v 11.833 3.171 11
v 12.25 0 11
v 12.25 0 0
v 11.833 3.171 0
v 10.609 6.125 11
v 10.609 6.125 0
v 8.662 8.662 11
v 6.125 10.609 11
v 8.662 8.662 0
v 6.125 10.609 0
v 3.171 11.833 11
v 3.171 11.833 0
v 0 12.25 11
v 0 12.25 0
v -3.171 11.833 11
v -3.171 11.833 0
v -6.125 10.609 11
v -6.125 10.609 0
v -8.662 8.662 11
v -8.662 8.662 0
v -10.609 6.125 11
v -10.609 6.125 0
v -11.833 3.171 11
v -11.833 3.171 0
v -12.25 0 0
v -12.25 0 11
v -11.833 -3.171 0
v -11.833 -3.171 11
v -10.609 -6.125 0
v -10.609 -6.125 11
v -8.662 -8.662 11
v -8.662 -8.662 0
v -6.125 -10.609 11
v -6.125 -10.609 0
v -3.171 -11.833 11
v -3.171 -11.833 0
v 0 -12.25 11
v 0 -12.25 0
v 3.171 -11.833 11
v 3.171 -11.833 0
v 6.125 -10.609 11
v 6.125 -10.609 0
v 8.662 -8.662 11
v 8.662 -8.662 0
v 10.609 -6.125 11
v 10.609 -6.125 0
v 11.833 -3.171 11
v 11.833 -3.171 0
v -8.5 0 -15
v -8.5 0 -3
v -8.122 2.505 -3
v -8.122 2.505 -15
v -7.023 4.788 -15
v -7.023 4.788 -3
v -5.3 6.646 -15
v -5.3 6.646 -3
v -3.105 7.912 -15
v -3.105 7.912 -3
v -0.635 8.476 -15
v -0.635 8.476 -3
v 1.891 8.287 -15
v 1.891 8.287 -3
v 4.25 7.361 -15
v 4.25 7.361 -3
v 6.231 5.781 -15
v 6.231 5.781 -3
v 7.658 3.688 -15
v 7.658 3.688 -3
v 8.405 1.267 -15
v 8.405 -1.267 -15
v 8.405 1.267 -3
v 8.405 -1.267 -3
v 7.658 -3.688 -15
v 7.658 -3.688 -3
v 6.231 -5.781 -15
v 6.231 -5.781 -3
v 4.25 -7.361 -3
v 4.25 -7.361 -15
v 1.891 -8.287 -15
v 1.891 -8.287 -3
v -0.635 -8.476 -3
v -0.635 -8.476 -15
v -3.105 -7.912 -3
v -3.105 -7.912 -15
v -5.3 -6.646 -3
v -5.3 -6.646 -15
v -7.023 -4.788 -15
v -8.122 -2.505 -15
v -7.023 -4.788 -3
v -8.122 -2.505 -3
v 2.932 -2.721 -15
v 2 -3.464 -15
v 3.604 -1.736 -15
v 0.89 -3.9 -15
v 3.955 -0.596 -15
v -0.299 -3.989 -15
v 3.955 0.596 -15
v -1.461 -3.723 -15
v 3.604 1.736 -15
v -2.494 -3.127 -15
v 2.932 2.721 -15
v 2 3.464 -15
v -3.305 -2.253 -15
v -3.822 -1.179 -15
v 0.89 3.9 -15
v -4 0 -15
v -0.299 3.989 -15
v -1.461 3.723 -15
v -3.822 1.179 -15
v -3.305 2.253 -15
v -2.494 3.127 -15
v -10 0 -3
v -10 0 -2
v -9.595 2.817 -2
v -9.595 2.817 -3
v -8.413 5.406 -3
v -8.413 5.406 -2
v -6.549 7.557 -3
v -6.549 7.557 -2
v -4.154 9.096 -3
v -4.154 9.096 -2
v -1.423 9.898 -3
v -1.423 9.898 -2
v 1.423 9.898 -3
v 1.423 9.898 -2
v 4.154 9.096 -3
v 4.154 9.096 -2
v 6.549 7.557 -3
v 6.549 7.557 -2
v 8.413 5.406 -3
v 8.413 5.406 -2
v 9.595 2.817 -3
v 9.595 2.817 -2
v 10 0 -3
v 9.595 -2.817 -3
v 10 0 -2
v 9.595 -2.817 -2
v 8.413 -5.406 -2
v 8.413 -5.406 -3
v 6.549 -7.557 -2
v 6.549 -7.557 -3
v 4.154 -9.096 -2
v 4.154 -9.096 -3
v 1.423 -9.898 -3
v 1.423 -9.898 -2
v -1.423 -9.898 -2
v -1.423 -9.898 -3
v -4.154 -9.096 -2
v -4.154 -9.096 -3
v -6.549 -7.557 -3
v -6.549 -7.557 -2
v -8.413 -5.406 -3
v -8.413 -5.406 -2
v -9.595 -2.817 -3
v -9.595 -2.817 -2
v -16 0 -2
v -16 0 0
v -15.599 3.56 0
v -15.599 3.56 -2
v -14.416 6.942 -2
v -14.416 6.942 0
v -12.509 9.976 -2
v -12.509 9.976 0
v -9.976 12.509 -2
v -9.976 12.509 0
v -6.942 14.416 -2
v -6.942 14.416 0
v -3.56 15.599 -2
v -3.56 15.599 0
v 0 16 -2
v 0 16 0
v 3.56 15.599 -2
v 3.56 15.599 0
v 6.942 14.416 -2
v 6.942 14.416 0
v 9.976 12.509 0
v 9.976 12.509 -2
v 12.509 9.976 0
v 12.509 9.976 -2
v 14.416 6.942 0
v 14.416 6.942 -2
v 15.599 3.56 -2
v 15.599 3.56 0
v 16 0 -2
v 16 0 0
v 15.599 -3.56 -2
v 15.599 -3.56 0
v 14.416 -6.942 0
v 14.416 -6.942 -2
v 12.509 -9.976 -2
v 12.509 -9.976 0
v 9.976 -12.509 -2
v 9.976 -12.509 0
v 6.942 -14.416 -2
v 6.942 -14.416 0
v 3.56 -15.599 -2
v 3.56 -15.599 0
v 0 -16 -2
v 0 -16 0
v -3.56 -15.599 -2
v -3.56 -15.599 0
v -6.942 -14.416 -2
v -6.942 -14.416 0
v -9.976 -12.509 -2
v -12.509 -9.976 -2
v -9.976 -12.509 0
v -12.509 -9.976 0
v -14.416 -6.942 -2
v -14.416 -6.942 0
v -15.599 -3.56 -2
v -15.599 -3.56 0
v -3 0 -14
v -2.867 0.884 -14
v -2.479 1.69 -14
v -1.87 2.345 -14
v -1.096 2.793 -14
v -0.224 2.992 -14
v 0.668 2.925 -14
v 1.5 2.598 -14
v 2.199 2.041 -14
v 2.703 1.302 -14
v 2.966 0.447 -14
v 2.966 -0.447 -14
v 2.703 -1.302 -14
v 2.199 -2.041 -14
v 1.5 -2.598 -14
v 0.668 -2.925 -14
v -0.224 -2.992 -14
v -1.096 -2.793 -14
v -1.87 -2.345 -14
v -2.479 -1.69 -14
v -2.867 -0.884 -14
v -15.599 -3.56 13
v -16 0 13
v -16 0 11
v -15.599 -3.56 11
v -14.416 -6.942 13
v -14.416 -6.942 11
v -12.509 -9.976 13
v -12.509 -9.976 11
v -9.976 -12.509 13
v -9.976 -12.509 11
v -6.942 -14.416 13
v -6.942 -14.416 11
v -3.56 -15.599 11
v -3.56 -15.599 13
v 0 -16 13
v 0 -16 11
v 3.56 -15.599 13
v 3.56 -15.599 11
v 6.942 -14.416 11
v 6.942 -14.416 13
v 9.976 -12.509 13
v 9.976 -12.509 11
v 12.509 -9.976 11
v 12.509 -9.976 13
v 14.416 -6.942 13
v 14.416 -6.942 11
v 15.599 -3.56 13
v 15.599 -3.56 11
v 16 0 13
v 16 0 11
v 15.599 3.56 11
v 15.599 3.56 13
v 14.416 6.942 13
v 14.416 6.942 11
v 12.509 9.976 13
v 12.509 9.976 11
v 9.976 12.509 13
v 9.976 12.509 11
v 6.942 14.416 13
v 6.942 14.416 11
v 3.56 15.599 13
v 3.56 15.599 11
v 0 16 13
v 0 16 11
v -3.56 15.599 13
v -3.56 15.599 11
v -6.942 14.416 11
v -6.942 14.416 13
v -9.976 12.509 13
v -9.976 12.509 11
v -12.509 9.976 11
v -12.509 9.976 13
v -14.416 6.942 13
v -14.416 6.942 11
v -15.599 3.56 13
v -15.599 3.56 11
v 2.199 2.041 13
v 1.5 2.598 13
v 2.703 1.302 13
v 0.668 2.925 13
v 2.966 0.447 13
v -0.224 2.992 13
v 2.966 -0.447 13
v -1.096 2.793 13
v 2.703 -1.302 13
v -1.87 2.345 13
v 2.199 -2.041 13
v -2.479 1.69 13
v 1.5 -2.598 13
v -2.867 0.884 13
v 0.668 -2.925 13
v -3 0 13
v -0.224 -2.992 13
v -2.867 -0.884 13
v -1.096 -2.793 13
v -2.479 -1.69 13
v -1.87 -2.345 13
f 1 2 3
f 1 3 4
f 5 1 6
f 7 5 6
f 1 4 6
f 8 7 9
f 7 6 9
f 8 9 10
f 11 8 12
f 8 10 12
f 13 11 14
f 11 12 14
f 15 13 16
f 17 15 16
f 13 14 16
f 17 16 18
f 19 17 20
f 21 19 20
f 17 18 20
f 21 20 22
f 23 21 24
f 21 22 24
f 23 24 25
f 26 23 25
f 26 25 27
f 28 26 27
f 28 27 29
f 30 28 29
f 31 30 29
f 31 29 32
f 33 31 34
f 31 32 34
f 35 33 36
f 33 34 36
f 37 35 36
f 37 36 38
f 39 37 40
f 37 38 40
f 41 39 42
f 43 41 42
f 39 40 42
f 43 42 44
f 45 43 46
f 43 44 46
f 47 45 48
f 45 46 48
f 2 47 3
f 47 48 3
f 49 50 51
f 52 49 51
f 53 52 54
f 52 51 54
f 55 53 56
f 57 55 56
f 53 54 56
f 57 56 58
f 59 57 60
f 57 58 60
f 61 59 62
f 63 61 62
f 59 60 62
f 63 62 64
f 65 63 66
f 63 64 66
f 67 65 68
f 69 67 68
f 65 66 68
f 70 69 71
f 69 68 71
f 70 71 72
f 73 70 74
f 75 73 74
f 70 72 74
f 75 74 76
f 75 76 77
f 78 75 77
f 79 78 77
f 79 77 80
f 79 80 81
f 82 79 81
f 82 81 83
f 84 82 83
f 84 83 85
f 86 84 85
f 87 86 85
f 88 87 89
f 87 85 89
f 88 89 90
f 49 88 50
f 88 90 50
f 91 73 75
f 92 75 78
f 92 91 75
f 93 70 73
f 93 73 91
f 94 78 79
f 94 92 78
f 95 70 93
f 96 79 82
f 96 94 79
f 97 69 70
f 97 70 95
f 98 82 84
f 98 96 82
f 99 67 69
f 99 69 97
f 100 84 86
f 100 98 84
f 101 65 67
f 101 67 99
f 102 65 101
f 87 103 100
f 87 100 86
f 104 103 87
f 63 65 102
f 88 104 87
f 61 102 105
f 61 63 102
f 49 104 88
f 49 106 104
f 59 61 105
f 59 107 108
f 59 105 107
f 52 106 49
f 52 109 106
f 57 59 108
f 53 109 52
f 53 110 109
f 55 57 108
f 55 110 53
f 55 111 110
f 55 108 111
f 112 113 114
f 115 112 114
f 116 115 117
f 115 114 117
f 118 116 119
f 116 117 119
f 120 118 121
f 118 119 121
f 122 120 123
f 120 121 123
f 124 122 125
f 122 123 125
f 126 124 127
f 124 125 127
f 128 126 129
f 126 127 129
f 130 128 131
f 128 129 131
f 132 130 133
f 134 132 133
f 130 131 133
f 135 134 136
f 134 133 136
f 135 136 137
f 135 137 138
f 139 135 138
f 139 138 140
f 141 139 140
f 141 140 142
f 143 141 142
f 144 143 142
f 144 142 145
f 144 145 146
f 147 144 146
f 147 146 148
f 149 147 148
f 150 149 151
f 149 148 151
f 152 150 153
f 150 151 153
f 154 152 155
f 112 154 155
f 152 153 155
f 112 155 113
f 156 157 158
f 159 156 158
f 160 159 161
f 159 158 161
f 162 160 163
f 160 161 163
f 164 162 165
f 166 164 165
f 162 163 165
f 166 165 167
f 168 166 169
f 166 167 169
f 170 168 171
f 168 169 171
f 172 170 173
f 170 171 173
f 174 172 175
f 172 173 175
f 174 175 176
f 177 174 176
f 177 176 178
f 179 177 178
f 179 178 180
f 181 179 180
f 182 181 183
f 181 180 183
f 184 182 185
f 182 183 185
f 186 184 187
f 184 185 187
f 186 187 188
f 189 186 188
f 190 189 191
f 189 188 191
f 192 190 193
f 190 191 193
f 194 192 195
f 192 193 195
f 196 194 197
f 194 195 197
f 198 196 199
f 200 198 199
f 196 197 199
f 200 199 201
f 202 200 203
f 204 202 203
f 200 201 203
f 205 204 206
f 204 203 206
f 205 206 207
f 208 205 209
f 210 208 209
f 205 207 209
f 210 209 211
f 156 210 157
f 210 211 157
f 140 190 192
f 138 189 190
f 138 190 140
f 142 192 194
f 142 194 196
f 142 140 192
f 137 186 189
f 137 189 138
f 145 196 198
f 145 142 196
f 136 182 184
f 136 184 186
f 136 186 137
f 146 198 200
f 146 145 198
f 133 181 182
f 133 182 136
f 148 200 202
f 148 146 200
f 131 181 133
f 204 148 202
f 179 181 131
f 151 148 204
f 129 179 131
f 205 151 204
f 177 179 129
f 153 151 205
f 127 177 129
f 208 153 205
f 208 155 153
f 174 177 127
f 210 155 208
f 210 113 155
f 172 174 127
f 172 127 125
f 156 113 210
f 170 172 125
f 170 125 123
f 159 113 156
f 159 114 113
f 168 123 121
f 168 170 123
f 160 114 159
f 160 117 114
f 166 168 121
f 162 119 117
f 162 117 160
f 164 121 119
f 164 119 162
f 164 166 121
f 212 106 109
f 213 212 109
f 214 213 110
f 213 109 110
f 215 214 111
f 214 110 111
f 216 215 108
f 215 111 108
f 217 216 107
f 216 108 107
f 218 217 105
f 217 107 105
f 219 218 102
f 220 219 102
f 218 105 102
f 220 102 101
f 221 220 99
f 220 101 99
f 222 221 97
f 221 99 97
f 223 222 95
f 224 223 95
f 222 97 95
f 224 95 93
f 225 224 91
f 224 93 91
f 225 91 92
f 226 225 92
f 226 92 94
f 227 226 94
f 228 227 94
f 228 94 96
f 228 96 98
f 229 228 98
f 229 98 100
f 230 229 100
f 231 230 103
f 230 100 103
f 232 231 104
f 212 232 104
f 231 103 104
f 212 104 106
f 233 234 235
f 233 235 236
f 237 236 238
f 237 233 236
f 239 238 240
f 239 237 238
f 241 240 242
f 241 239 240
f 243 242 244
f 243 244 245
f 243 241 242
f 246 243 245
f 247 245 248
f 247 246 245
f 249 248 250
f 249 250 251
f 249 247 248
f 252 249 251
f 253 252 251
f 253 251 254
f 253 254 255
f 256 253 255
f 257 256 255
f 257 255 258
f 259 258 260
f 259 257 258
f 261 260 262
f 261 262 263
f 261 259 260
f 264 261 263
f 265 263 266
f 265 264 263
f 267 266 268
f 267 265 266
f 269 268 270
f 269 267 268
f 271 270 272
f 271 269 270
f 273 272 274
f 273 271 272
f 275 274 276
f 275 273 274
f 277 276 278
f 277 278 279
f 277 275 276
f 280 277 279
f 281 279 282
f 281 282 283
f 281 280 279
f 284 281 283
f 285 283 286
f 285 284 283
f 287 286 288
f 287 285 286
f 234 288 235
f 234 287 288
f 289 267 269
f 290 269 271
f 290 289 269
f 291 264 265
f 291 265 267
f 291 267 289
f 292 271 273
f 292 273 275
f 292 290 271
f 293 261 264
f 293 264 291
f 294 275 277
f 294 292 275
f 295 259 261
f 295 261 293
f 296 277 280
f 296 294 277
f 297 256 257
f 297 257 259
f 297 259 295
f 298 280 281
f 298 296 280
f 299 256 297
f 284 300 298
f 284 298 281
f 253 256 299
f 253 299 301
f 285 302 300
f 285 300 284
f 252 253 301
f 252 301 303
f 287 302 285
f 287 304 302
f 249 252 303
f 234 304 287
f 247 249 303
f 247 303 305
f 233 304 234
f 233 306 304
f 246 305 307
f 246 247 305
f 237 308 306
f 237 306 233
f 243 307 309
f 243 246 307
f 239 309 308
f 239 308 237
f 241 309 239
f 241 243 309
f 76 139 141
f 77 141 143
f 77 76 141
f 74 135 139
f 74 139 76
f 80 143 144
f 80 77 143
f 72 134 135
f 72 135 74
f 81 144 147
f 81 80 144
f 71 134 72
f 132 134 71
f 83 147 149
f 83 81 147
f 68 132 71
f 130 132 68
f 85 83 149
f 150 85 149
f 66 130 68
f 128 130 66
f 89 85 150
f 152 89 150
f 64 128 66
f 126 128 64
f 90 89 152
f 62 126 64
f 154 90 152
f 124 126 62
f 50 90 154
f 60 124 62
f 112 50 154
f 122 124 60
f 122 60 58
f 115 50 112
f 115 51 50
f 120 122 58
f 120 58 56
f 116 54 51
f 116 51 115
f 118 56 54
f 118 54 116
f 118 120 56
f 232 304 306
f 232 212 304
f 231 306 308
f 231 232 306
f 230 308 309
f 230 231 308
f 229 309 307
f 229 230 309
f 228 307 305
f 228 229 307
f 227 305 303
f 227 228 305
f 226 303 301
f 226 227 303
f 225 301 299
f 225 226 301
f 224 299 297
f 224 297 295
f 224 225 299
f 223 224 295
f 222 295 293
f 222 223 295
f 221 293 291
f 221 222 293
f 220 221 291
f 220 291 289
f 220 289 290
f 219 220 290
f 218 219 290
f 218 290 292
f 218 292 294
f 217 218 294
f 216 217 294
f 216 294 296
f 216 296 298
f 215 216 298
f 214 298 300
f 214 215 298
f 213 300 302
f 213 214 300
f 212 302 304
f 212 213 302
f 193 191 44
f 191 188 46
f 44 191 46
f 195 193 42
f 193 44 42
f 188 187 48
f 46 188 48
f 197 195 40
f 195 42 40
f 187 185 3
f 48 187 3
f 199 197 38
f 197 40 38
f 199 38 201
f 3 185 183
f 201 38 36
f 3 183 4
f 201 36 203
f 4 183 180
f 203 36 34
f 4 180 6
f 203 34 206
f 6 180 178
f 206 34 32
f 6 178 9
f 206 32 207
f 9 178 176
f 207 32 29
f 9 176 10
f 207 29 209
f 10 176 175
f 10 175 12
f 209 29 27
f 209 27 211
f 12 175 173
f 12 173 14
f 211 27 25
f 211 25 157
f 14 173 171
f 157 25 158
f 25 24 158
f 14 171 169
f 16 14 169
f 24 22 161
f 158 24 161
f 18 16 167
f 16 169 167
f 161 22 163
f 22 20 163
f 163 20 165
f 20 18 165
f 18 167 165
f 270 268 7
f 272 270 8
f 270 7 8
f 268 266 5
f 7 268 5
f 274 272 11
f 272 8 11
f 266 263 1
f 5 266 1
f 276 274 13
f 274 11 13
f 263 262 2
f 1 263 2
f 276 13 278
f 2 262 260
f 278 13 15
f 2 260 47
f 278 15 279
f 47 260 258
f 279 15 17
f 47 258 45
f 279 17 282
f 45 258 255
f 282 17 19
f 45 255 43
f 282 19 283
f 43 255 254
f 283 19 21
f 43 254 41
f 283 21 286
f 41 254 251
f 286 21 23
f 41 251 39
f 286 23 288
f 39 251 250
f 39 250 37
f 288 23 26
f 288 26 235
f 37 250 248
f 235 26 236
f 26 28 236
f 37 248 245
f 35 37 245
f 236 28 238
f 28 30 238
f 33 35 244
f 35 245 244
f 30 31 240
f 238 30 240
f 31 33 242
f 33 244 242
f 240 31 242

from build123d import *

# Parameters (mm, degrees)
SKETCH1_R           = 12.25
BOSS_EXTRUDE1_DEPTH = 11
SKETCH2_R           = 16
BOSS_EXTRUDE2_DEPTH = 2
SKETCH4_R           = 10
BOSS_EXTRUDE4_DEPTH = 1
SKETCH5_R           = 8.5
BOSS_EXTRUDE5_DEPTH = 12
SKETCH6_R           = 3
CUT_EXTRUDE1_DEPTH  = 100
CHAMFER1_SIZE       = 1
BOSS_EXTRUDE6_START = 2
SKETCH3_R           = 16
BOSS_EXTRUDE6_DEPTH = 2
CUT_EXTRUDE2_START  = -10
SKETCH7_R           = 3
CUT_EXTRUDE2_DEPTH  = 10


with BuildPart() as part:
    # Sketch1 → Boss-Extrude1 (new body)
    with BuildSketch(Plane.XY):
        Circle(SKETCH1_R)
    extrude(amount=BOSS_EXTRUDE1_DEPTH)

    # Sketch2 → Boss-Extrude2 (add)
    with BuildSketch(Plane(origin=(0, 0, 0), x_dir=(-1, 0, 0), z_dir=(0, 0, -1))):
        Circle(SKETCH2_R)
    extrude(amount=BOSS_EXTRUDE2_DEPTH)

    # Sketch4 → Boss-Extrude4 (add)
    with BuildSketch(Plane(origin=(0, 0, -2), x_dir=(-1, 0, 0), z_dir=(0, 0, -1))):
        Circle(SKETCH4_R)
    extrude(amount=BOSS_EXTRUDE4_DEPTH)

    # Sketch5 → Boss-Extrude5 (add)
    with BuildSketch(Plane(origin=(0, 0, -3), x_dir=(-1, 0, 0), z_dir=(0, 0, -1))):
        Circle(SKETCH5_R)
    extrude(amount=BOSS_EXTRUDE5_DEPTH)

    # Sketch6 → Cut-Extrude1 (cut)
    with BuildSketch(Plane(origin=(0, 0, -15), x_dir=(-1, 0, 0), z_dir=(0, 0, -1))):
        Circle(SKETCH6_R)
    extrude(amount=-CUT_EXTRUDE1_DEPTH, mode=Mode.SUBTRACT)

    # Chamfer1
    chamfer1_edges = [part.edges().sort_by_distance(p)[0] for p in [
        (3, 0, -15),
    ]]
    chamfer(chamfer1_edges, length=CHAMFER1_SIZE)

    # Sketch3 → Boss-Extrude6 (add)
    with BuildSketch(Plane.XY.offset(11).offset(BOSS_EXTRUDE6_START)):
        with Locations(Location((0, 0, 0), (0, 0, 180))):
            Circle(SKETCH3_R)
    extrude(amount=-BOSS_EXTRUDE6_DEPTH)

    # Sketch7 → Cut-Extrude2 (cut)
    with BuildSketch(Plane.XY.offset(13).offset(CUT_EXTRUDE2_START)):
        with Locations(Location((0, 0, 0), (0, 0, 180))):
            Circle(SKETCH7_R)
    extrude(amount=CUT_EXTRUDE2_DEPTH, mode=Mode.SUBTRACT)


solid = part.part
